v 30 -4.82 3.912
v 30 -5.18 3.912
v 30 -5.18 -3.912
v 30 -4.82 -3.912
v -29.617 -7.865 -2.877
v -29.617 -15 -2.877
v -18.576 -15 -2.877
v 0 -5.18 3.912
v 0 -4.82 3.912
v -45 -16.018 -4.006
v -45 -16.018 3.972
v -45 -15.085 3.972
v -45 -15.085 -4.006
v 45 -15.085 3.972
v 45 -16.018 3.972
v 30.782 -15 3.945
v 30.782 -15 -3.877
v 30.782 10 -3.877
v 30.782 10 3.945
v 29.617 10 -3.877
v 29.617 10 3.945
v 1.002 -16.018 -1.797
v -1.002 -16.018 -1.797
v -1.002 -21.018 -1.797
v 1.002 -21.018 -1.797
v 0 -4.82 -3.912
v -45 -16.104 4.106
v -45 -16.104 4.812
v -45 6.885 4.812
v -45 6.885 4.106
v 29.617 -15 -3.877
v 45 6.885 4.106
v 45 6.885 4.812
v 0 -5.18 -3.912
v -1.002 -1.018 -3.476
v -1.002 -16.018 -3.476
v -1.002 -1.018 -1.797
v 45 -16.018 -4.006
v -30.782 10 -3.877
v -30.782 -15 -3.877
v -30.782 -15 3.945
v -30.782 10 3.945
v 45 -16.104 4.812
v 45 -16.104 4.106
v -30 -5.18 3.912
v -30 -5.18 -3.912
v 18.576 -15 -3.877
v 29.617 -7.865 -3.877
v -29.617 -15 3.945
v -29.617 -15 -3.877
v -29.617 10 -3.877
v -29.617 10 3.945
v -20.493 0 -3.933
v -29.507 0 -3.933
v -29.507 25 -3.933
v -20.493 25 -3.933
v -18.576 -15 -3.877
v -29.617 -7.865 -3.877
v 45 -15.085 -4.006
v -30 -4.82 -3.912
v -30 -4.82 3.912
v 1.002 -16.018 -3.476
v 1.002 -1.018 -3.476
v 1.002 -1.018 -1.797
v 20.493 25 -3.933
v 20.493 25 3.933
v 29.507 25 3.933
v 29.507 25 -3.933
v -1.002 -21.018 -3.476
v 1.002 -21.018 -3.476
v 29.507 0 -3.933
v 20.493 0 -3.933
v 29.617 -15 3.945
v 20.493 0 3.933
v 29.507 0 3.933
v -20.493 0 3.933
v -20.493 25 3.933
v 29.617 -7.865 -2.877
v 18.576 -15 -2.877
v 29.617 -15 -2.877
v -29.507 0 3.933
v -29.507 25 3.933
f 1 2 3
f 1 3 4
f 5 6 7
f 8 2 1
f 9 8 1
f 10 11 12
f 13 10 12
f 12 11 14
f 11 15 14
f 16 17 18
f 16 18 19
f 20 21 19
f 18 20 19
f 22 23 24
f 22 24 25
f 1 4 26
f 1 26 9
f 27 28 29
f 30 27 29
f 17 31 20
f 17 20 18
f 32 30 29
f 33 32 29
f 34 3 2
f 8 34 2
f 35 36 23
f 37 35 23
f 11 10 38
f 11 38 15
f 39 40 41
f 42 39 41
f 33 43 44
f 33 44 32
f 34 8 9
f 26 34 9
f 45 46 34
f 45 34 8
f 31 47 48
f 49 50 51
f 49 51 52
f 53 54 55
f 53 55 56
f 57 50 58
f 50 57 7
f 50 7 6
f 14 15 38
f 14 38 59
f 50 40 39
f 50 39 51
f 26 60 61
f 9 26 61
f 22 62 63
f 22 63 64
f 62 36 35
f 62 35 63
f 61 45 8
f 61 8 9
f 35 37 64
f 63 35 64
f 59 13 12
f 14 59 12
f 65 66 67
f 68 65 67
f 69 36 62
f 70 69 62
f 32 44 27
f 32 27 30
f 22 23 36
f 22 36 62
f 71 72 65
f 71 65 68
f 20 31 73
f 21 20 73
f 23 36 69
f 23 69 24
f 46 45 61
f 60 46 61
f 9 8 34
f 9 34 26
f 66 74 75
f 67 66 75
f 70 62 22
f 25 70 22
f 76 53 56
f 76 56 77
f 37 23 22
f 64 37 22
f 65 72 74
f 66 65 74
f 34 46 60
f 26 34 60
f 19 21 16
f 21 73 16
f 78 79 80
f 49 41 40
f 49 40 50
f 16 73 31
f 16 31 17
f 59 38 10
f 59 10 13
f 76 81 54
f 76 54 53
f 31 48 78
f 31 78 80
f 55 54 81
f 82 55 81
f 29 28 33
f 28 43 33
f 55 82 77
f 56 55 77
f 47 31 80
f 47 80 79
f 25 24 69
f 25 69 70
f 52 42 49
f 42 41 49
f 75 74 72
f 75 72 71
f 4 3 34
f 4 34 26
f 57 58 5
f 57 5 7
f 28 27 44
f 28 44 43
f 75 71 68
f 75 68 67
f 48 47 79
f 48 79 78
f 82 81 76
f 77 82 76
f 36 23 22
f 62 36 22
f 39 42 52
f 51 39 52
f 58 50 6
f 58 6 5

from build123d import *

# Parameters (mm, degrees)
F0_W      = 9.013751108
F0_H      = 7.866161422
F1_DEPTH  = 25
F2_W      = 1.1650789529
F2_H      = 7.8226653859
F3_DEPTH  = 15
F4_DEPTH  = 10
F5_DEPTH  = 10
F6_W      = 0.9330576286
F6_H      = 7.977636531
F7_DEPTH  = 45
F8_DEPTH  = 45
F9_W      = 22.9889024049
F9_H      = 0.7061436772
F10_DEPTH = 45
F11_DEPTH = 45
F13_DEPTH = 1
F14_W     = 0.3597940085
F14_H     = 7.8240241855
F15_DEPTH = 30
F16_DEPTH = 30
F18_W     = 2.0044790581
F18_H     = 1.6795026604
F19_DEPTH = 15
F20_DEPTH = 5


with BuildPart() as f1:
    # F0 (on Front) → F1 (new body)
    with BuildSketch(Plane.XZ):
        with Locations((-25, 0)):
            Rectangle(F0_W, F0_H)
    extrude(amount=-F1_DEPTH)


with BuildPart() as f1b:
    # F0 (on Front) → F1, piece 2 (new body)
    with BuildSketch(Plane.XZ):
        with Locations((25, 0)):
            Rectangle(F0_W, F0_H)
    extrude(amount=-F1_DEPTH)


with BuildPart() as f3:
    # F2 (on Front) → F3 (new body)
    with BuildSketch(Plane.XZ):
        with Locations((-30.1997521892, 0.0340505503)):
            Rectangle(F2_W, F2_H)
    extrude(amount=F3_DEPTH)

    # F4 (add): a face of the model
    f4_faces = [f3.faces().sort_by_distance(p)[0] for p in [
        (-30.1997521892, 0, 0.0340505503),
    ]]
    extrude(f4_faces, amount=F4_DEPTH)


with BuildPart() as f3b:
    # F2 (on Front) → F3, piece 2 (new body)
    with BuildSketch(Plane.XZ):
        with Locations((30.1997521892, 0.0340505503)):
            Rectangle(F2_W, F2_H)
    extrude(amount=F3_DEPTH)

    # F5 (add): a face of the model
    f5_faces = [f3b.faces().sort_by_distance(p)[0] for p in [
        (30.1997521892, 0, 0.0340505503),
    ]]
    extrude(f5_faces, amount=F5_DEPTH)


with BuildPart() as f7:
    # F6 (on Right) → F7 (new body)
    with BuildSketch(Plane.YZ):
        with Locations((-15.5513403006, -0.0170278363)):
            Rectangle(F6_W, F6_H)
    extrude(amount=F7_DEPTH)

    # F8 (add): a face of the model
    f8_faces = [f7.faces().sort_by_distance(p)[0] for p in [
        (0, -15.5513403006, -0.0170278363),
    ]]
    extrude(f8_faces, amount=F8_DEPTH)


with BuildPart() as f10:
    # F9 (on Right) → F10 (new body)
    with BuildSketch(Plane.YZ):
        with Locations((-4.6098036692, 4.4590970501)):
            Rectangle(F9_W, F9_H)
    extrude(amount=F10_DEPTH)

    # F11 (add): a face of the model
    f11_faces = [f10.faces().sort_by_distance(p)[0] for p in [
        (0, -4.6098036692, 4.4590970501),
    ]]
    extrude(f11_faces, amount=F11_DEPTH)


with BuildPart() as f13:
    # F12 (on face) → F13 (new body)
    with BuildSketch(Plane(origin=(0, 0, -3.8772821426), x_dir=(1, 0, 0), z_dir=(0, 0, -1))):
        Polygon((-18.57563667, 15), (-29.6172127128, 15), (-29.6172127128, 7.8648822382), align=None)
    extrude(amount=-F13_DEPTH)


with BuildPart() as f13b:
    # F12 (on face) → F13, piece 2 (new body)
    with BuildSketch(Plane(origin=(0, 0, -3.8772821426), x_dir=(1, 0, 0), z_dir=(0, 0, -1))):
        Polygon((18.57563667, 15), (29.6172127128, 7.8648822382), (29.6172127128, 15), align=None)
    extrude(amount=-F13_DEPTH)


with BuildPart() as f15:
    # F14 (on Right) → F15 (new body)
    with BuildSketch(Plane.YZ):
        Rectangle(F14_W, F14_H)
    extrude(amount=F15_DEPTH)


with BuildPart() as f16:
    # F16 (new): a face of the model
    f16_faces = [f15.part.faces().sort_by_distance(p)[0] for p in [
        (0, 0, 0),
    ]]
    extrude(f16_faces, amount=F16_DEPTH)


with BuildPart() as f16_1:
    # F17: moved
    add(f16.part.moved(Location((0, -5, 0))))


with BuildPart() as f15_1:
    # F17: moved
    add(f15.part.moved(Location((0, -5, 0))))


with BuildPart() as f19:
    # F18 (on face) → F19 (new body)
    with BuildSketch(Plane.XZ.offset(16.0178691149)):
        with Locations((0, -2.6366210077)):
            Rectangle(F18_W, F18_H)
    extrude(amount=-F19_DEPTH)


with BuildPart() as f20:
    # F20 (new): a face of the model
    f20_faces = [f19.part.faces().sort_by_distance(p)[0] for p in [
        (0, -16.0178691149, -2.6366210077),
    ]]
    extrude(f20_faces, amount=F20_DEPTH)


solid = Compound([f1.part, f1b.part, f3.part, f3b.part, f7.part, f10.part, f13.part, f13b.part, f16_1.part, f15_1.part, f19.part, f20.part])
